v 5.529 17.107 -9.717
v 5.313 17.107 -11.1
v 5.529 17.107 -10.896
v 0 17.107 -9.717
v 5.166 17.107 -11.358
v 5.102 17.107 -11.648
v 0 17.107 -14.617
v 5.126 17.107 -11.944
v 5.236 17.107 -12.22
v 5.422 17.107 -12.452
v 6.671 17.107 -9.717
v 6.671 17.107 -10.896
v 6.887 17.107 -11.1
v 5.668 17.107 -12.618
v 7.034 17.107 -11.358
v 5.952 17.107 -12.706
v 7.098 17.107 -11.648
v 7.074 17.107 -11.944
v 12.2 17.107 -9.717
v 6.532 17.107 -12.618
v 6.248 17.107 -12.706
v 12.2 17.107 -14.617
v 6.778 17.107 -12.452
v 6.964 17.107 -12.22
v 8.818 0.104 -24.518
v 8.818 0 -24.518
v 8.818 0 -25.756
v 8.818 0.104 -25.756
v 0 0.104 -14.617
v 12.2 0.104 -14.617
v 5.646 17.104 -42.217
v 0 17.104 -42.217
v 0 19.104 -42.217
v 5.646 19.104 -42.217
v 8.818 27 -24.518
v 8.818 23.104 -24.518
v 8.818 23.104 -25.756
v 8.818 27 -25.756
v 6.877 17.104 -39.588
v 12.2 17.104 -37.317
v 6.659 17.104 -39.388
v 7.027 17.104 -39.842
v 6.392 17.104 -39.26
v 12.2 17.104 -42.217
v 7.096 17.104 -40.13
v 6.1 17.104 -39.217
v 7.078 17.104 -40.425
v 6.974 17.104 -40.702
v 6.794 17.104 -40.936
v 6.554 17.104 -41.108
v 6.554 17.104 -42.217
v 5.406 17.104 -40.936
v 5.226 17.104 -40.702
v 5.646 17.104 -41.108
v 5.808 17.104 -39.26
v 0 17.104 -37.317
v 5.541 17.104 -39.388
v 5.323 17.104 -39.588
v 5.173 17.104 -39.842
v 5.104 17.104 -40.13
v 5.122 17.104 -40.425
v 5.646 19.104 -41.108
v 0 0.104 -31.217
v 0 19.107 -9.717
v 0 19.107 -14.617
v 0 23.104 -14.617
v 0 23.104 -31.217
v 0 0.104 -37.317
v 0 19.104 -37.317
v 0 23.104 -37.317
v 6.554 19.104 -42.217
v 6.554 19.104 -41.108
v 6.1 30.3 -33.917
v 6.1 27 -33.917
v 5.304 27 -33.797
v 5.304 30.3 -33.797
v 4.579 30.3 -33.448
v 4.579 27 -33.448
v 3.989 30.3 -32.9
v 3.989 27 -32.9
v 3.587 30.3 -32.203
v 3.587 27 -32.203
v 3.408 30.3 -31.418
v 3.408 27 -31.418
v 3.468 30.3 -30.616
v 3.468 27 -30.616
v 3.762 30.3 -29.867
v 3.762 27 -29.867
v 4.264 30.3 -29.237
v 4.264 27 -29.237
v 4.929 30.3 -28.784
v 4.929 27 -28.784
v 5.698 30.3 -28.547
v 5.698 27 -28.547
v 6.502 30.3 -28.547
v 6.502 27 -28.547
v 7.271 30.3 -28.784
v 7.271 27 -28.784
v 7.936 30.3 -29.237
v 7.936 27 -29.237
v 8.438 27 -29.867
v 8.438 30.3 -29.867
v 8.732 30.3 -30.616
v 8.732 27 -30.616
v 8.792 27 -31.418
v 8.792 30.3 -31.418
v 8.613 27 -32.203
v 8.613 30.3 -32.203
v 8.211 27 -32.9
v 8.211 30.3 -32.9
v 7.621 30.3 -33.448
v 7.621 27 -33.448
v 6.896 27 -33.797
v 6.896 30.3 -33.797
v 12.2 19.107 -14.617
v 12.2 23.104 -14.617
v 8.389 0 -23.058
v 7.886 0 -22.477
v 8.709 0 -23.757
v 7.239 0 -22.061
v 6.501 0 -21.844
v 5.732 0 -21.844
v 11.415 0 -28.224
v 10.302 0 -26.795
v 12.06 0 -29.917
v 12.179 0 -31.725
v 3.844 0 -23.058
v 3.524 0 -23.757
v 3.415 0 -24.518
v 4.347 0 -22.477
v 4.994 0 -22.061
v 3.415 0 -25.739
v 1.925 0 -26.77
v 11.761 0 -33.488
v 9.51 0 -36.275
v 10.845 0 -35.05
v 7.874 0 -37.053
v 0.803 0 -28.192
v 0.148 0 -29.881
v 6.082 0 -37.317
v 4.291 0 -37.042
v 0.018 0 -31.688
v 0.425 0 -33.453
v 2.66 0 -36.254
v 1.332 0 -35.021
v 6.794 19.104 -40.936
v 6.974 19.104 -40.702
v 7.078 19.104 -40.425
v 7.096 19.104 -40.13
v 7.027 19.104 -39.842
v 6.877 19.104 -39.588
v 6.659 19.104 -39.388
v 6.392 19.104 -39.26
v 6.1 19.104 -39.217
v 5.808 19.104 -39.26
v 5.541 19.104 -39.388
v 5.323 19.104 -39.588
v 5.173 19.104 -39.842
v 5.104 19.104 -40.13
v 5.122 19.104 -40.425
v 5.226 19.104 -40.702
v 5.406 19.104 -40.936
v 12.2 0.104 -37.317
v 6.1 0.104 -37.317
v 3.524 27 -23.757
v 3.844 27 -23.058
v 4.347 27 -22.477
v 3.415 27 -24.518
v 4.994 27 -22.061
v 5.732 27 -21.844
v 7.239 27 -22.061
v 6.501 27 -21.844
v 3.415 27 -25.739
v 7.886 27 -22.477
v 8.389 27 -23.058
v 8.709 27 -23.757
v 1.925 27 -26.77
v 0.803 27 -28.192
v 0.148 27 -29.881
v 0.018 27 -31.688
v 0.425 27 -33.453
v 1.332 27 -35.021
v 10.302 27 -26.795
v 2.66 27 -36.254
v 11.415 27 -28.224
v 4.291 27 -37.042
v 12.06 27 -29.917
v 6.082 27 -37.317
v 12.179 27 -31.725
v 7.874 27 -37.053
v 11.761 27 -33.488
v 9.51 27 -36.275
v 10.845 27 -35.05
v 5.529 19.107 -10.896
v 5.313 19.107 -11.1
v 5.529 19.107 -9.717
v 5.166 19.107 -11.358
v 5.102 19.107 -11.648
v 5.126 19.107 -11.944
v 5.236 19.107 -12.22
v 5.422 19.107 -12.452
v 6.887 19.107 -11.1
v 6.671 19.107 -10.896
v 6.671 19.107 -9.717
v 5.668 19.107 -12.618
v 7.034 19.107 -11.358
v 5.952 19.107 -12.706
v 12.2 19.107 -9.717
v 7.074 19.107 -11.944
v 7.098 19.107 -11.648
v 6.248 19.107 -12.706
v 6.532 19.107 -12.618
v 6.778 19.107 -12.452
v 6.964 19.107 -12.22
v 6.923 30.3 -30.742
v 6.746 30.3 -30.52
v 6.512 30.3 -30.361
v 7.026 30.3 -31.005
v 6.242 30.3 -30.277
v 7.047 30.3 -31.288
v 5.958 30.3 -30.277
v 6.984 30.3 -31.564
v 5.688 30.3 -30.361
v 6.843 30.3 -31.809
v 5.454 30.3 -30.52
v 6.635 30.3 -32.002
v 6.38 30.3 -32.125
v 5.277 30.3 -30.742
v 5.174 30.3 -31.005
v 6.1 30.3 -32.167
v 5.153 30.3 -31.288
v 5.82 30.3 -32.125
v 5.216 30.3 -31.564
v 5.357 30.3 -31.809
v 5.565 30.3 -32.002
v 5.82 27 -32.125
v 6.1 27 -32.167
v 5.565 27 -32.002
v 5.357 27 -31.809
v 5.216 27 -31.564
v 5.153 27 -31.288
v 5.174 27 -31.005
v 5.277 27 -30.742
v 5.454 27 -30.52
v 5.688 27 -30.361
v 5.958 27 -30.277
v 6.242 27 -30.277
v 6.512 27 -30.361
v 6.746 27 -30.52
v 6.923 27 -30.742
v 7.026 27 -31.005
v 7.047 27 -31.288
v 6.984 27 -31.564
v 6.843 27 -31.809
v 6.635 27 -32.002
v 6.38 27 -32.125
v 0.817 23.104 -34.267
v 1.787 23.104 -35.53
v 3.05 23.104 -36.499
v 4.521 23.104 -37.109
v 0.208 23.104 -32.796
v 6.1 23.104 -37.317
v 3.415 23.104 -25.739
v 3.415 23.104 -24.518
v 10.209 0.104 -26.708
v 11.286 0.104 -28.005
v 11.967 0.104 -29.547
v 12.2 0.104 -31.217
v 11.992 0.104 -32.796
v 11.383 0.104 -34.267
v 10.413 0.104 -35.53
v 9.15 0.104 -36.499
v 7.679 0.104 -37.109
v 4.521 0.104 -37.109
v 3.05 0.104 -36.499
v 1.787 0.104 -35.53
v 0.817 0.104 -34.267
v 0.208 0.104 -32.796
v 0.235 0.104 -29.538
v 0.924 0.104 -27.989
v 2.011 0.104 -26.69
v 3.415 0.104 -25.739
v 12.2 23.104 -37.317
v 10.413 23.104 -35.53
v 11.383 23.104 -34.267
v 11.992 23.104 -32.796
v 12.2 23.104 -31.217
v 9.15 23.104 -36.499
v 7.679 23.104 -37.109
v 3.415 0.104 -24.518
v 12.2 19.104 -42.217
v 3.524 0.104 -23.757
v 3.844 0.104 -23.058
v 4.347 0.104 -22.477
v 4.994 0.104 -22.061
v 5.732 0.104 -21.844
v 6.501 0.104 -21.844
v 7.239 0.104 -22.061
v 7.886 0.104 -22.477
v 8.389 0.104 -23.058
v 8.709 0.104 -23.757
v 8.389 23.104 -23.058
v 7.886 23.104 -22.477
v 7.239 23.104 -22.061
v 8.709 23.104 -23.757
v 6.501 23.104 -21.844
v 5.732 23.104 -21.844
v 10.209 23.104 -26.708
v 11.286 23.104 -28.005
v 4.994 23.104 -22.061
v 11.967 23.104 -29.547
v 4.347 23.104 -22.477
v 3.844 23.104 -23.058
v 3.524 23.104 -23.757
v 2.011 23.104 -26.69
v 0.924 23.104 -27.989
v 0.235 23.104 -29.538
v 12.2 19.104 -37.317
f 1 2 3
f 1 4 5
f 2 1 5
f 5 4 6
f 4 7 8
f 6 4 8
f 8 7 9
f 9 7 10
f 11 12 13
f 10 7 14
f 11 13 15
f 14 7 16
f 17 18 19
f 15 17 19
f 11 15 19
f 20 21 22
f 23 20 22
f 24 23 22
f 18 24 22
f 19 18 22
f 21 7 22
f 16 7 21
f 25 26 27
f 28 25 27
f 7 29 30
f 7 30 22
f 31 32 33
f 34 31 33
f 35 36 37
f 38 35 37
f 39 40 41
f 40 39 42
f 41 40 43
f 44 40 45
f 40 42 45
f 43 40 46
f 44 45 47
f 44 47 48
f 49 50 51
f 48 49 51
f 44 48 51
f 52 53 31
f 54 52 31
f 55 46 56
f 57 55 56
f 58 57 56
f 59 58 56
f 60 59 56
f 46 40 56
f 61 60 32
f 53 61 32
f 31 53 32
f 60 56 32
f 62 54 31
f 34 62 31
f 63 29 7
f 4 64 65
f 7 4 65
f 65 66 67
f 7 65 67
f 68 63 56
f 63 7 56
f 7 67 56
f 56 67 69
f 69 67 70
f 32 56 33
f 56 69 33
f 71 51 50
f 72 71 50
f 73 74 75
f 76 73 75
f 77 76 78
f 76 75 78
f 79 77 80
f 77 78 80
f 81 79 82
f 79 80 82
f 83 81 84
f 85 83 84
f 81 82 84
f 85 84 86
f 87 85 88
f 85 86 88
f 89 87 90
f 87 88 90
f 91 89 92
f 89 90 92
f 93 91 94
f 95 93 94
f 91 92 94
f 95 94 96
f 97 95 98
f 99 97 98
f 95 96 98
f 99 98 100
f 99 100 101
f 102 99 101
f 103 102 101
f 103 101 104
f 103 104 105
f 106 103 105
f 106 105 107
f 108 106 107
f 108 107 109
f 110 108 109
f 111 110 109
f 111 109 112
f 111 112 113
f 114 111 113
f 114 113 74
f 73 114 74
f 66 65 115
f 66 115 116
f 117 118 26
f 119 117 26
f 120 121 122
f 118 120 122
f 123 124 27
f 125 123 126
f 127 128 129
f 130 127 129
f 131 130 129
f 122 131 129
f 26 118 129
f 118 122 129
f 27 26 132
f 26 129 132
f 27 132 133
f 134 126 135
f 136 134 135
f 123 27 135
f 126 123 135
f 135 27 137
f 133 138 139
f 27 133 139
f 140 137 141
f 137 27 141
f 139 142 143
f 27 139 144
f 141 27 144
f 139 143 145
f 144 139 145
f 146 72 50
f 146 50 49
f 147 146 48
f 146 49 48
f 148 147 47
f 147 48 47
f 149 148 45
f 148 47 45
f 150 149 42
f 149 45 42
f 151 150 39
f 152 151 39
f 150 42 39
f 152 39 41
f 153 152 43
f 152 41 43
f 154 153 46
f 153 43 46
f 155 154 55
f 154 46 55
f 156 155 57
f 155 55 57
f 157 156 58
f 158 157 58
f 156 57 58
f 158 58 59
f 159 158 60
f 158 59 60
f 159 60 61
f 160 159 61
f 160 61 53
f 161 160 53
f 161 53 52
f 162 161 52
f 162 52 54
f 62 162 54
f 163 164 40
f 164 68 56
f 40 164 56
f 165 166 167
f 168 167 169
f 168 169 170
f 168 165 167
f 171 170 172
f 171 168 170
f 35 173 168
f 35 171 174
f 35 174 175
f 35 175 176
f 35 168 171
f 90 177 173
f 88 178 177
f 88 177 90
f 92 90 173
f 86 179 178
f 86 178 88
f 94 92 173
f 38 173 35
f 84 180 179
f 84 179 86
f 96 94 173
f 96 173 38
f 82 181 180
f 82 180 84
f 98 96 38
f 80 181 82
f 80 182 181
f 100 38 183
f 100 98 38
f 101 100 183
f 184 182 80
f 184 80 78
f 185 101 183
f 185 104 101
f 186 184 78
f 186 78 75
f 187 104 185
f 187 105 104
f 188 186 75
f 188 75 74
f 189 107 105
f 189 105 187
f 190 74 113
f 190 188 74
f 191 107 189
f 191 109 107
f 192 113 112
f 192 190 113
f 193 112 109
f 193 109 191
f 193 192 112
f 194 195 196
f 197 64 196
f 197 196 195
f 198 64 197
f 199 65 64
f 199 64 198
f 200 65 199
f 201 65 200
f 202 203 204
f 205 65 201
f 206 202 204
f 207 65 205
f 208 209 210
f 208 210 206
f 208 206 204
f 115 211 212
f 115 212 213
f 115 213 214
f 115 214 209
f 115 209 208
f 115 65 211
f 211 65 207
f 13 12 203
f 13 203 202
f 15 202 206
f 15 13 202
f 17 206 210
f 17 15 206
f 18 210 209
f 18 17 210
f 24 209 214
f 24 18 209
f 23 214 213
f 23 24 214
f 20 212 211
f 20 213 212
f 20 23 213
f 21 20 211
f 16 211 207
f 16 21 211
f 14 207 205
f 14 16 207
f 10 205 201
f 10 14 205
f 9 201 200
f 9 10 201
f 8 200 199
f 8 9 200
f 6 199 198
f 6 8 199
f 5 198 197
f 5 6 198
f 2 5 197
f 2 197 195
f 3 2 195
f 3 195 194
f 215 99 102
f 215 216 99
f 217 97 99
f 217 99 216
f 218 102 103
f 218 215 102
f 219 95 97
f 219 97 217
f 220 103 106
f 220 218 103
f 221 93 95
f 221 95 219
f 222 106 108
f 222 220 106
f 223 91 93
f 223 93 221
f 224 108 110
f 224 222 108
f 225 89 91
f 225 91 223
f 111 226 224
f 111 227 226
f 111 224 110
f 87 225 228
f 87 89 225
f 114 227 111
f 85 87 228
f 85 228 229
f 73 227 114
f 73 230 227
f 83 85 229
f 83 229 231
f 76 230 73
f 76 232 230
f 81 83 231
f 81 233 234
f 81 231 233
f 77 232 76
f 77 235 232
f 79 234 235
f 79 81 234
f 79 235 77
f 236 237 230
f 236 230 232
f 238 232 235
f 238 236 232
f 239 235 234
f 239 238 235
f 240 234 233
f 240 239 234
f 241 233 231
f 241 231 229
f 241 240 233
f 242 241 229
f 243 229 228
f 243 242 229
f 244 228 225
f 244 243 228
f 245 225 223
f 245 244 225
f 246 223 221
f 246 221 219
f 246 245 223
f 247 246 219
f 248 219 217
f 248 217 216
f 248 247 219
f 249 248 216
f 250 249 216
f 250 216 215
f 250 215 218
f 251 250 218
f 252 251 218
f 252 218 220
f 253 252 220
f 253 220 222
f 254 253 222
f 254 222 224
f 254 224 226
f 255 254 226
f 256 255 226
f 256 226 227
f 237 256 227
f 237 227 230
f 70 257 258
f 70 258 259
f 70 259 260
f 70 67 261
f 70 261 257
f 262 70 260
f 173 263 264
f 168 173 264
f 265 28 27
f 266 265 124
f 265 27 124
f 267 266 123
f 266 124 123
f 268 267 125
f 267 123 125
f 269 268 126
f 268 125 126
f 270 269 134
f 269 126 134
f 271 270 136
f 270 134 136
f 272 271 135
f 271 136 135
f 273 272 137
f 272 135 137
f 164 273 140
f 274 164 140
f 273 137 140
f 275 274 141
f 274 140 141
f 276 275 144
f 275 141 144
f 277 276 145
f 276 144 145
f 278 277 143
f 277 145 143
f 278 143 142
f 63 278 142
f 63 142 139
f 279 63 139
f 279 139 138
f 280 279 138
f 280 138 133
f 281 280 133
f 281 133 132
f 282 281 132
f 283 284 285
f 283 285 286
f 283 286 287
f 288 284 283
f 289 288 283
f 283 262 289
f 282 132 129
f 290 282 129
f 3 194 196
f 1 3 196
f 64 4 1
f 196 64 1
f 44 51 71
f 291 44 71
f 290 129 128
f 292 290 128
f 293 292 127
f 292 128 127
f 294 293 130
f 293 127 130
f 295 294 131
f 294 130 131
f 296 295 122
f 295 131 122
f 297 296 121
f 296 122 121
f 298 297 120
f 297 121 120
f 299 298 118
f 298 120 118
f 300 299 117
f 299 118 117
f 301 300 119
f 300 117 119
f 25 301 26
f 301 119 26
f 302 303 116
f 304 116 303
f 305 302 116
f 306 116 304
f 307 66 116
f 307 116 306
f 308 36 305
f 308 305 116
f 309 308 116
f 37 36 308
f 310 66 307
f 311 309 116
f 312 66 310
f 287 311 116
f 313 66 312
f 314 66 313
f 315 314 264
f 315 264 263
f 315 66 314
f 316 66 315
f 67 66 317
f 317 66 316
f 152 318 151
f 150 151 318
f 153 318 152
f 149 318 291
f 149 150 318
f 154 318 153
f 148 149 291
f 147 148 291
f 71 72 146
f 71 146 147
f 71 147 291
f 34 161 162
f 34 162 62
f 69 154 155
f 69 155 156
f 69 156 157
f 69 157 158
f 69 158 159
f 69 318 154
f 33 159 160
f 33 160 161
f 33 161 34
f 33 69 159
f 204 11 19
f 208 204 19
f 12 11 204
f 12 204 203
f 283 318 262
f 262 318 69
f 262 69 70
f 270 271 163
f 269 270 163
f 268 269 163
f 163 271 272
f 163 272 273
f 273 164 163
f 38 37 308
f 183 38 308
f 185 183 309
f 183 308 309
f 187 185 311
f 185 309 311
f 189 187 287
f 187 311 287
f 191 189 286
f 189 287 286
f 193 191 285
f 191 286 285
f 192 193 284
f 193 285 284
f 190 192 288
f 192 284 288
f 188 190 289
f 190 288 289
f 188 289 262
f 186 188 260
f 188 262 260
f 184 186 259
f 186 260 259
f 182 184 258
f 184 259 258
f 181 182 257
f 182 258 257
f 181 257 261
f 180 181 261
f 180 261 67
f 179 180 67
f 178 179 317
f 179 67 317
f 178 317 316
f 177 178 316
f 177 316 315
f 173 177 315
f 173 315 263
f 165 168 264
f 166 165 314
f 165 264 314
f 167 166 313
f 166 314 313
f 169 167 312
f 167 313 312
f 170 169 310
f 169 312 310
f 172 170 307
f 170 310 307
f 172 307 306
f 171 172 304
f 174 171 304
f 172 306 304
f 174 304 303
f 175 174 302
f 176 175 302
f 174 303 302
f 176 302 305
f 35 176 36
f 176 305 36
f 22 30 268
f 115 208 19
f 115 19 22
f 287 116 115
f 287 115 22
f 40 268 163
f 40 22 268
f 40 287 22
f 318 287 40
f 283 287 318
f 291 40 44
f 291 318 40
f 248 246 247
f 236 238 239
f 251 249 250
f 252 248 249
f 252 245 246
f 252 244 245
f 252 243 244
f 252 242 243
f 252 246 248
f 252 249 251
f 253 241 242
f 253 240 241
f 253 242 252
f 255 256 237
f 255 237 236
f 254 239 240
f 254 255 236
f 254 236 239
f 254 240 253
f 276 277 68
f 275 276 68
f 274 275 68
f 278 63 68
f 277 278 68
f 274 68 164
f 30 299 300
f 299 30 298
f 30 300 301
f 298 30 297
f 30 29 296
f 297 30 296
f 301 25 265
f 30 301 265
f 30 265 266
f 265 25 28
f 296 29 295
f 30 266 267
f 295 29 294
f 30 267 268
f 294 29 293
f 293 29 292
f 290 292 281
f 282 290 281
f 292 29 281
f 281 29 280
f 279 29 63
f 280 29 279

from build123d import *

# Parameters (mm, degrees)
SKETCH2_W               = 22.7
SKETCH2_H               = 23
BOSS_EXTRUDE1_DEPTH     = 12.2
BOSS_EXTRUDE2_START     = 17.106506393
BOSS_EXTRUDE2_OUTLINE_W = 12.2
BOSS_EXTRUDE2_OUTLINE_H = 4.9
BOSS_EXTRUDE2_DEPTH     = 2
SKETCH5_W               = 4.9
SKETCH5_H               = 2
BOSS_EXTRUDE4_DEPTH     = 12.2
SKETCH11_R              = 2.7
SKETCH11_R_2            = 0.95
BOSS_EXTRUDE6_DEPTH     = 27
SKETCH11_4_R            = 2.7
SKETCH11_4_R_2          = 0.95
BOSS_EXTRUDE7_DEPTH     = 30.3
CUT_EXTRUDE3_DEPTH      = 30.3
CUT_EXTRUDE4_DEPTH      = 30.3


# Read off the part's stored shape, not the designer's step: Boss-Extrude2
with BuildPart() as part:
    # Sketch2 → Boss-Extrude1 (new body)
    with BuildSketch(Plane(origin=(0, 0, 0), x_dir=(0, 0, -1), z_dir=(1, 0, 0))):
        with Locations((25.966711769, 11.60401504)):
            Rectangle(SKETCH2_W, SKETCH2_H)
    extrude(amount=BOSS_EXTRUDE1_DEPTH)

    # Boss-Extrude2 outline → Boss-Extrude2 (add)
    with BuildSketch(Plane(origin=(0, 0, 0), x_dir=(1, 0, 0), z_dir=(0, 1, 0)).offset(BOSS_EXTRUDE2_START)):
        with Locations((6.1, 12.166711769)):
            Rectangle(BOSS_EXTRUDE2_OUTLINE_W, BOSS_EXTRUDE2_OUTLINE_H)
    extrude(amount=BOSS_EXTRUDE2_DEPTH)

    # Sketch5 → Boss-Extrude4 (add)
    with BuildSketch(Plane(origin=(0, 0, 0), x_dir=(0, 0, -1), z_dir=(1, 0, 0))):
        with Locations((39.766711769, 18.10401504)):
            Rectangle(SKETCH5_W, SKETCH5_H)
    extrude(amount=BOSS_EXTRUDE4_DEPTH)

    # Sketch11 → Boss-Extrude6 (add)
    # profile 1 of 3: a face of its own
    with BuildSketch(Plane(origin=(0, 0, 0), x_dir=(1, 0, 0), z_dir=(0, 1, 0))):
        with BuildLine():
            ThreePointArc((8.818225568, 25.755828163), (6.081508494, 37.316683741), (3.414932422, 25.739448575))
            Line((3.414932422, 25.739448575), (3.414932422, 24.518358342))
            ThreePointArc((3.414932422, 24.518358342), (6.116578995, 21.816711769), (8.818225568, 24.518358342))
            Line((8.818225568, 24.518358342), (8.818225568, 25.755828163))
        make_face()
        with Locations((6.1, 31.216711769)):
            Circle(SKETCH11_R, mode=Mode.SUBTRACT)
    # profile 2 of 3: a face of its own
    with BuildSketch(Plane(origin=(0, 0, 0), x_dir=(1, 0, 0), z_dir=(0, 1, 0))):
        with Locations((6.1, 31.216711769)):
            Circle(SKETCH11_R)
        with Locations((6.1, 31.216711769)):
            Circle(SKETCH11_R_2, mode=Mode.SUBTRACT)
    # profile 3 of 3: a face of its own
    with BuildSketch(Plane(origin=(0, 0, 0), x_dir=(1, 0, 0), z_dir=(0, 1, 0))):
        with Locations((6.1, 31.216711769)):
            Circle(SKETCH11_R_2)
    extrude(amount=BOSS_EXTRUDE6_DEPTH)

    # Sketch11<4> → Boss-Extrude7 (add)
    with BuildSketch(Plane(origin=(0, 0, 0), x_dir=(1, 0, 0), z_dir=(0, 1, 0))):
        with Locations(Location((6.1, 31.216711769, 0), (0, 0, 90))):
            Circle(SKETCH11_4_R)
        with Locations(Location((6.1, 31.216711769, 0), (0, 0, 90))):
            Circle(SKETCH11_4_R_2, mode=Mode.SUBTRACT)
    extrude(amount=BOSS_EXTRUDE7_DEPTH)

    # Sketch13 → Cut-Extrude3 (cut)
    with BuildSketch(Plane(origin=(0, 0, 0), x_dir=(1, 0, 0), z_dir=(0, 1, 0))):
        with BuildLine():
            Line((5.528535179, 10.896085205), (5.528535179, 9.716711769))
            Line((5.528535179, 9.716711769), (6.671464821, 9.716711769))
            Line((6.671464821, 9.716711769), (6.671464821, 10.896085205))
            ThreePointArc((6.671464821, 10.896085205), (6.1, 12.716711769), (5.528535179, 10.896085205))
        make_face()
    extrude(amount=CUT_EXTRUDE3_DEPTH, mode=Mode.SUBTRACT)

    # Sketch16 → Cut-Extrude4 (cut)
    with BuildSketch(Plane(origin=(0, 0, 0), x_dir=(1, 0, 0), z_dir=(0, 1, 0))):
        with BuildLine():
            Line((5.646488236, 42.216711769), (6.553511764, 42.216711769))
            Line((6.553511764, 42.216711769), (6.553511764, 41.107962059))
            ThreePointArc((6.553511764, 41.107962059), (6.1, 39.216711769), (5.646488236, 41.107962059))
            Line((5.646488236, 41.107962059), (5.646488236, 42.216711769))
        make_face()
    extrude(amount=CUT_EXTRUDE4_DEPTH, mode=Mode.SUBTRACT)


solid = part.part
